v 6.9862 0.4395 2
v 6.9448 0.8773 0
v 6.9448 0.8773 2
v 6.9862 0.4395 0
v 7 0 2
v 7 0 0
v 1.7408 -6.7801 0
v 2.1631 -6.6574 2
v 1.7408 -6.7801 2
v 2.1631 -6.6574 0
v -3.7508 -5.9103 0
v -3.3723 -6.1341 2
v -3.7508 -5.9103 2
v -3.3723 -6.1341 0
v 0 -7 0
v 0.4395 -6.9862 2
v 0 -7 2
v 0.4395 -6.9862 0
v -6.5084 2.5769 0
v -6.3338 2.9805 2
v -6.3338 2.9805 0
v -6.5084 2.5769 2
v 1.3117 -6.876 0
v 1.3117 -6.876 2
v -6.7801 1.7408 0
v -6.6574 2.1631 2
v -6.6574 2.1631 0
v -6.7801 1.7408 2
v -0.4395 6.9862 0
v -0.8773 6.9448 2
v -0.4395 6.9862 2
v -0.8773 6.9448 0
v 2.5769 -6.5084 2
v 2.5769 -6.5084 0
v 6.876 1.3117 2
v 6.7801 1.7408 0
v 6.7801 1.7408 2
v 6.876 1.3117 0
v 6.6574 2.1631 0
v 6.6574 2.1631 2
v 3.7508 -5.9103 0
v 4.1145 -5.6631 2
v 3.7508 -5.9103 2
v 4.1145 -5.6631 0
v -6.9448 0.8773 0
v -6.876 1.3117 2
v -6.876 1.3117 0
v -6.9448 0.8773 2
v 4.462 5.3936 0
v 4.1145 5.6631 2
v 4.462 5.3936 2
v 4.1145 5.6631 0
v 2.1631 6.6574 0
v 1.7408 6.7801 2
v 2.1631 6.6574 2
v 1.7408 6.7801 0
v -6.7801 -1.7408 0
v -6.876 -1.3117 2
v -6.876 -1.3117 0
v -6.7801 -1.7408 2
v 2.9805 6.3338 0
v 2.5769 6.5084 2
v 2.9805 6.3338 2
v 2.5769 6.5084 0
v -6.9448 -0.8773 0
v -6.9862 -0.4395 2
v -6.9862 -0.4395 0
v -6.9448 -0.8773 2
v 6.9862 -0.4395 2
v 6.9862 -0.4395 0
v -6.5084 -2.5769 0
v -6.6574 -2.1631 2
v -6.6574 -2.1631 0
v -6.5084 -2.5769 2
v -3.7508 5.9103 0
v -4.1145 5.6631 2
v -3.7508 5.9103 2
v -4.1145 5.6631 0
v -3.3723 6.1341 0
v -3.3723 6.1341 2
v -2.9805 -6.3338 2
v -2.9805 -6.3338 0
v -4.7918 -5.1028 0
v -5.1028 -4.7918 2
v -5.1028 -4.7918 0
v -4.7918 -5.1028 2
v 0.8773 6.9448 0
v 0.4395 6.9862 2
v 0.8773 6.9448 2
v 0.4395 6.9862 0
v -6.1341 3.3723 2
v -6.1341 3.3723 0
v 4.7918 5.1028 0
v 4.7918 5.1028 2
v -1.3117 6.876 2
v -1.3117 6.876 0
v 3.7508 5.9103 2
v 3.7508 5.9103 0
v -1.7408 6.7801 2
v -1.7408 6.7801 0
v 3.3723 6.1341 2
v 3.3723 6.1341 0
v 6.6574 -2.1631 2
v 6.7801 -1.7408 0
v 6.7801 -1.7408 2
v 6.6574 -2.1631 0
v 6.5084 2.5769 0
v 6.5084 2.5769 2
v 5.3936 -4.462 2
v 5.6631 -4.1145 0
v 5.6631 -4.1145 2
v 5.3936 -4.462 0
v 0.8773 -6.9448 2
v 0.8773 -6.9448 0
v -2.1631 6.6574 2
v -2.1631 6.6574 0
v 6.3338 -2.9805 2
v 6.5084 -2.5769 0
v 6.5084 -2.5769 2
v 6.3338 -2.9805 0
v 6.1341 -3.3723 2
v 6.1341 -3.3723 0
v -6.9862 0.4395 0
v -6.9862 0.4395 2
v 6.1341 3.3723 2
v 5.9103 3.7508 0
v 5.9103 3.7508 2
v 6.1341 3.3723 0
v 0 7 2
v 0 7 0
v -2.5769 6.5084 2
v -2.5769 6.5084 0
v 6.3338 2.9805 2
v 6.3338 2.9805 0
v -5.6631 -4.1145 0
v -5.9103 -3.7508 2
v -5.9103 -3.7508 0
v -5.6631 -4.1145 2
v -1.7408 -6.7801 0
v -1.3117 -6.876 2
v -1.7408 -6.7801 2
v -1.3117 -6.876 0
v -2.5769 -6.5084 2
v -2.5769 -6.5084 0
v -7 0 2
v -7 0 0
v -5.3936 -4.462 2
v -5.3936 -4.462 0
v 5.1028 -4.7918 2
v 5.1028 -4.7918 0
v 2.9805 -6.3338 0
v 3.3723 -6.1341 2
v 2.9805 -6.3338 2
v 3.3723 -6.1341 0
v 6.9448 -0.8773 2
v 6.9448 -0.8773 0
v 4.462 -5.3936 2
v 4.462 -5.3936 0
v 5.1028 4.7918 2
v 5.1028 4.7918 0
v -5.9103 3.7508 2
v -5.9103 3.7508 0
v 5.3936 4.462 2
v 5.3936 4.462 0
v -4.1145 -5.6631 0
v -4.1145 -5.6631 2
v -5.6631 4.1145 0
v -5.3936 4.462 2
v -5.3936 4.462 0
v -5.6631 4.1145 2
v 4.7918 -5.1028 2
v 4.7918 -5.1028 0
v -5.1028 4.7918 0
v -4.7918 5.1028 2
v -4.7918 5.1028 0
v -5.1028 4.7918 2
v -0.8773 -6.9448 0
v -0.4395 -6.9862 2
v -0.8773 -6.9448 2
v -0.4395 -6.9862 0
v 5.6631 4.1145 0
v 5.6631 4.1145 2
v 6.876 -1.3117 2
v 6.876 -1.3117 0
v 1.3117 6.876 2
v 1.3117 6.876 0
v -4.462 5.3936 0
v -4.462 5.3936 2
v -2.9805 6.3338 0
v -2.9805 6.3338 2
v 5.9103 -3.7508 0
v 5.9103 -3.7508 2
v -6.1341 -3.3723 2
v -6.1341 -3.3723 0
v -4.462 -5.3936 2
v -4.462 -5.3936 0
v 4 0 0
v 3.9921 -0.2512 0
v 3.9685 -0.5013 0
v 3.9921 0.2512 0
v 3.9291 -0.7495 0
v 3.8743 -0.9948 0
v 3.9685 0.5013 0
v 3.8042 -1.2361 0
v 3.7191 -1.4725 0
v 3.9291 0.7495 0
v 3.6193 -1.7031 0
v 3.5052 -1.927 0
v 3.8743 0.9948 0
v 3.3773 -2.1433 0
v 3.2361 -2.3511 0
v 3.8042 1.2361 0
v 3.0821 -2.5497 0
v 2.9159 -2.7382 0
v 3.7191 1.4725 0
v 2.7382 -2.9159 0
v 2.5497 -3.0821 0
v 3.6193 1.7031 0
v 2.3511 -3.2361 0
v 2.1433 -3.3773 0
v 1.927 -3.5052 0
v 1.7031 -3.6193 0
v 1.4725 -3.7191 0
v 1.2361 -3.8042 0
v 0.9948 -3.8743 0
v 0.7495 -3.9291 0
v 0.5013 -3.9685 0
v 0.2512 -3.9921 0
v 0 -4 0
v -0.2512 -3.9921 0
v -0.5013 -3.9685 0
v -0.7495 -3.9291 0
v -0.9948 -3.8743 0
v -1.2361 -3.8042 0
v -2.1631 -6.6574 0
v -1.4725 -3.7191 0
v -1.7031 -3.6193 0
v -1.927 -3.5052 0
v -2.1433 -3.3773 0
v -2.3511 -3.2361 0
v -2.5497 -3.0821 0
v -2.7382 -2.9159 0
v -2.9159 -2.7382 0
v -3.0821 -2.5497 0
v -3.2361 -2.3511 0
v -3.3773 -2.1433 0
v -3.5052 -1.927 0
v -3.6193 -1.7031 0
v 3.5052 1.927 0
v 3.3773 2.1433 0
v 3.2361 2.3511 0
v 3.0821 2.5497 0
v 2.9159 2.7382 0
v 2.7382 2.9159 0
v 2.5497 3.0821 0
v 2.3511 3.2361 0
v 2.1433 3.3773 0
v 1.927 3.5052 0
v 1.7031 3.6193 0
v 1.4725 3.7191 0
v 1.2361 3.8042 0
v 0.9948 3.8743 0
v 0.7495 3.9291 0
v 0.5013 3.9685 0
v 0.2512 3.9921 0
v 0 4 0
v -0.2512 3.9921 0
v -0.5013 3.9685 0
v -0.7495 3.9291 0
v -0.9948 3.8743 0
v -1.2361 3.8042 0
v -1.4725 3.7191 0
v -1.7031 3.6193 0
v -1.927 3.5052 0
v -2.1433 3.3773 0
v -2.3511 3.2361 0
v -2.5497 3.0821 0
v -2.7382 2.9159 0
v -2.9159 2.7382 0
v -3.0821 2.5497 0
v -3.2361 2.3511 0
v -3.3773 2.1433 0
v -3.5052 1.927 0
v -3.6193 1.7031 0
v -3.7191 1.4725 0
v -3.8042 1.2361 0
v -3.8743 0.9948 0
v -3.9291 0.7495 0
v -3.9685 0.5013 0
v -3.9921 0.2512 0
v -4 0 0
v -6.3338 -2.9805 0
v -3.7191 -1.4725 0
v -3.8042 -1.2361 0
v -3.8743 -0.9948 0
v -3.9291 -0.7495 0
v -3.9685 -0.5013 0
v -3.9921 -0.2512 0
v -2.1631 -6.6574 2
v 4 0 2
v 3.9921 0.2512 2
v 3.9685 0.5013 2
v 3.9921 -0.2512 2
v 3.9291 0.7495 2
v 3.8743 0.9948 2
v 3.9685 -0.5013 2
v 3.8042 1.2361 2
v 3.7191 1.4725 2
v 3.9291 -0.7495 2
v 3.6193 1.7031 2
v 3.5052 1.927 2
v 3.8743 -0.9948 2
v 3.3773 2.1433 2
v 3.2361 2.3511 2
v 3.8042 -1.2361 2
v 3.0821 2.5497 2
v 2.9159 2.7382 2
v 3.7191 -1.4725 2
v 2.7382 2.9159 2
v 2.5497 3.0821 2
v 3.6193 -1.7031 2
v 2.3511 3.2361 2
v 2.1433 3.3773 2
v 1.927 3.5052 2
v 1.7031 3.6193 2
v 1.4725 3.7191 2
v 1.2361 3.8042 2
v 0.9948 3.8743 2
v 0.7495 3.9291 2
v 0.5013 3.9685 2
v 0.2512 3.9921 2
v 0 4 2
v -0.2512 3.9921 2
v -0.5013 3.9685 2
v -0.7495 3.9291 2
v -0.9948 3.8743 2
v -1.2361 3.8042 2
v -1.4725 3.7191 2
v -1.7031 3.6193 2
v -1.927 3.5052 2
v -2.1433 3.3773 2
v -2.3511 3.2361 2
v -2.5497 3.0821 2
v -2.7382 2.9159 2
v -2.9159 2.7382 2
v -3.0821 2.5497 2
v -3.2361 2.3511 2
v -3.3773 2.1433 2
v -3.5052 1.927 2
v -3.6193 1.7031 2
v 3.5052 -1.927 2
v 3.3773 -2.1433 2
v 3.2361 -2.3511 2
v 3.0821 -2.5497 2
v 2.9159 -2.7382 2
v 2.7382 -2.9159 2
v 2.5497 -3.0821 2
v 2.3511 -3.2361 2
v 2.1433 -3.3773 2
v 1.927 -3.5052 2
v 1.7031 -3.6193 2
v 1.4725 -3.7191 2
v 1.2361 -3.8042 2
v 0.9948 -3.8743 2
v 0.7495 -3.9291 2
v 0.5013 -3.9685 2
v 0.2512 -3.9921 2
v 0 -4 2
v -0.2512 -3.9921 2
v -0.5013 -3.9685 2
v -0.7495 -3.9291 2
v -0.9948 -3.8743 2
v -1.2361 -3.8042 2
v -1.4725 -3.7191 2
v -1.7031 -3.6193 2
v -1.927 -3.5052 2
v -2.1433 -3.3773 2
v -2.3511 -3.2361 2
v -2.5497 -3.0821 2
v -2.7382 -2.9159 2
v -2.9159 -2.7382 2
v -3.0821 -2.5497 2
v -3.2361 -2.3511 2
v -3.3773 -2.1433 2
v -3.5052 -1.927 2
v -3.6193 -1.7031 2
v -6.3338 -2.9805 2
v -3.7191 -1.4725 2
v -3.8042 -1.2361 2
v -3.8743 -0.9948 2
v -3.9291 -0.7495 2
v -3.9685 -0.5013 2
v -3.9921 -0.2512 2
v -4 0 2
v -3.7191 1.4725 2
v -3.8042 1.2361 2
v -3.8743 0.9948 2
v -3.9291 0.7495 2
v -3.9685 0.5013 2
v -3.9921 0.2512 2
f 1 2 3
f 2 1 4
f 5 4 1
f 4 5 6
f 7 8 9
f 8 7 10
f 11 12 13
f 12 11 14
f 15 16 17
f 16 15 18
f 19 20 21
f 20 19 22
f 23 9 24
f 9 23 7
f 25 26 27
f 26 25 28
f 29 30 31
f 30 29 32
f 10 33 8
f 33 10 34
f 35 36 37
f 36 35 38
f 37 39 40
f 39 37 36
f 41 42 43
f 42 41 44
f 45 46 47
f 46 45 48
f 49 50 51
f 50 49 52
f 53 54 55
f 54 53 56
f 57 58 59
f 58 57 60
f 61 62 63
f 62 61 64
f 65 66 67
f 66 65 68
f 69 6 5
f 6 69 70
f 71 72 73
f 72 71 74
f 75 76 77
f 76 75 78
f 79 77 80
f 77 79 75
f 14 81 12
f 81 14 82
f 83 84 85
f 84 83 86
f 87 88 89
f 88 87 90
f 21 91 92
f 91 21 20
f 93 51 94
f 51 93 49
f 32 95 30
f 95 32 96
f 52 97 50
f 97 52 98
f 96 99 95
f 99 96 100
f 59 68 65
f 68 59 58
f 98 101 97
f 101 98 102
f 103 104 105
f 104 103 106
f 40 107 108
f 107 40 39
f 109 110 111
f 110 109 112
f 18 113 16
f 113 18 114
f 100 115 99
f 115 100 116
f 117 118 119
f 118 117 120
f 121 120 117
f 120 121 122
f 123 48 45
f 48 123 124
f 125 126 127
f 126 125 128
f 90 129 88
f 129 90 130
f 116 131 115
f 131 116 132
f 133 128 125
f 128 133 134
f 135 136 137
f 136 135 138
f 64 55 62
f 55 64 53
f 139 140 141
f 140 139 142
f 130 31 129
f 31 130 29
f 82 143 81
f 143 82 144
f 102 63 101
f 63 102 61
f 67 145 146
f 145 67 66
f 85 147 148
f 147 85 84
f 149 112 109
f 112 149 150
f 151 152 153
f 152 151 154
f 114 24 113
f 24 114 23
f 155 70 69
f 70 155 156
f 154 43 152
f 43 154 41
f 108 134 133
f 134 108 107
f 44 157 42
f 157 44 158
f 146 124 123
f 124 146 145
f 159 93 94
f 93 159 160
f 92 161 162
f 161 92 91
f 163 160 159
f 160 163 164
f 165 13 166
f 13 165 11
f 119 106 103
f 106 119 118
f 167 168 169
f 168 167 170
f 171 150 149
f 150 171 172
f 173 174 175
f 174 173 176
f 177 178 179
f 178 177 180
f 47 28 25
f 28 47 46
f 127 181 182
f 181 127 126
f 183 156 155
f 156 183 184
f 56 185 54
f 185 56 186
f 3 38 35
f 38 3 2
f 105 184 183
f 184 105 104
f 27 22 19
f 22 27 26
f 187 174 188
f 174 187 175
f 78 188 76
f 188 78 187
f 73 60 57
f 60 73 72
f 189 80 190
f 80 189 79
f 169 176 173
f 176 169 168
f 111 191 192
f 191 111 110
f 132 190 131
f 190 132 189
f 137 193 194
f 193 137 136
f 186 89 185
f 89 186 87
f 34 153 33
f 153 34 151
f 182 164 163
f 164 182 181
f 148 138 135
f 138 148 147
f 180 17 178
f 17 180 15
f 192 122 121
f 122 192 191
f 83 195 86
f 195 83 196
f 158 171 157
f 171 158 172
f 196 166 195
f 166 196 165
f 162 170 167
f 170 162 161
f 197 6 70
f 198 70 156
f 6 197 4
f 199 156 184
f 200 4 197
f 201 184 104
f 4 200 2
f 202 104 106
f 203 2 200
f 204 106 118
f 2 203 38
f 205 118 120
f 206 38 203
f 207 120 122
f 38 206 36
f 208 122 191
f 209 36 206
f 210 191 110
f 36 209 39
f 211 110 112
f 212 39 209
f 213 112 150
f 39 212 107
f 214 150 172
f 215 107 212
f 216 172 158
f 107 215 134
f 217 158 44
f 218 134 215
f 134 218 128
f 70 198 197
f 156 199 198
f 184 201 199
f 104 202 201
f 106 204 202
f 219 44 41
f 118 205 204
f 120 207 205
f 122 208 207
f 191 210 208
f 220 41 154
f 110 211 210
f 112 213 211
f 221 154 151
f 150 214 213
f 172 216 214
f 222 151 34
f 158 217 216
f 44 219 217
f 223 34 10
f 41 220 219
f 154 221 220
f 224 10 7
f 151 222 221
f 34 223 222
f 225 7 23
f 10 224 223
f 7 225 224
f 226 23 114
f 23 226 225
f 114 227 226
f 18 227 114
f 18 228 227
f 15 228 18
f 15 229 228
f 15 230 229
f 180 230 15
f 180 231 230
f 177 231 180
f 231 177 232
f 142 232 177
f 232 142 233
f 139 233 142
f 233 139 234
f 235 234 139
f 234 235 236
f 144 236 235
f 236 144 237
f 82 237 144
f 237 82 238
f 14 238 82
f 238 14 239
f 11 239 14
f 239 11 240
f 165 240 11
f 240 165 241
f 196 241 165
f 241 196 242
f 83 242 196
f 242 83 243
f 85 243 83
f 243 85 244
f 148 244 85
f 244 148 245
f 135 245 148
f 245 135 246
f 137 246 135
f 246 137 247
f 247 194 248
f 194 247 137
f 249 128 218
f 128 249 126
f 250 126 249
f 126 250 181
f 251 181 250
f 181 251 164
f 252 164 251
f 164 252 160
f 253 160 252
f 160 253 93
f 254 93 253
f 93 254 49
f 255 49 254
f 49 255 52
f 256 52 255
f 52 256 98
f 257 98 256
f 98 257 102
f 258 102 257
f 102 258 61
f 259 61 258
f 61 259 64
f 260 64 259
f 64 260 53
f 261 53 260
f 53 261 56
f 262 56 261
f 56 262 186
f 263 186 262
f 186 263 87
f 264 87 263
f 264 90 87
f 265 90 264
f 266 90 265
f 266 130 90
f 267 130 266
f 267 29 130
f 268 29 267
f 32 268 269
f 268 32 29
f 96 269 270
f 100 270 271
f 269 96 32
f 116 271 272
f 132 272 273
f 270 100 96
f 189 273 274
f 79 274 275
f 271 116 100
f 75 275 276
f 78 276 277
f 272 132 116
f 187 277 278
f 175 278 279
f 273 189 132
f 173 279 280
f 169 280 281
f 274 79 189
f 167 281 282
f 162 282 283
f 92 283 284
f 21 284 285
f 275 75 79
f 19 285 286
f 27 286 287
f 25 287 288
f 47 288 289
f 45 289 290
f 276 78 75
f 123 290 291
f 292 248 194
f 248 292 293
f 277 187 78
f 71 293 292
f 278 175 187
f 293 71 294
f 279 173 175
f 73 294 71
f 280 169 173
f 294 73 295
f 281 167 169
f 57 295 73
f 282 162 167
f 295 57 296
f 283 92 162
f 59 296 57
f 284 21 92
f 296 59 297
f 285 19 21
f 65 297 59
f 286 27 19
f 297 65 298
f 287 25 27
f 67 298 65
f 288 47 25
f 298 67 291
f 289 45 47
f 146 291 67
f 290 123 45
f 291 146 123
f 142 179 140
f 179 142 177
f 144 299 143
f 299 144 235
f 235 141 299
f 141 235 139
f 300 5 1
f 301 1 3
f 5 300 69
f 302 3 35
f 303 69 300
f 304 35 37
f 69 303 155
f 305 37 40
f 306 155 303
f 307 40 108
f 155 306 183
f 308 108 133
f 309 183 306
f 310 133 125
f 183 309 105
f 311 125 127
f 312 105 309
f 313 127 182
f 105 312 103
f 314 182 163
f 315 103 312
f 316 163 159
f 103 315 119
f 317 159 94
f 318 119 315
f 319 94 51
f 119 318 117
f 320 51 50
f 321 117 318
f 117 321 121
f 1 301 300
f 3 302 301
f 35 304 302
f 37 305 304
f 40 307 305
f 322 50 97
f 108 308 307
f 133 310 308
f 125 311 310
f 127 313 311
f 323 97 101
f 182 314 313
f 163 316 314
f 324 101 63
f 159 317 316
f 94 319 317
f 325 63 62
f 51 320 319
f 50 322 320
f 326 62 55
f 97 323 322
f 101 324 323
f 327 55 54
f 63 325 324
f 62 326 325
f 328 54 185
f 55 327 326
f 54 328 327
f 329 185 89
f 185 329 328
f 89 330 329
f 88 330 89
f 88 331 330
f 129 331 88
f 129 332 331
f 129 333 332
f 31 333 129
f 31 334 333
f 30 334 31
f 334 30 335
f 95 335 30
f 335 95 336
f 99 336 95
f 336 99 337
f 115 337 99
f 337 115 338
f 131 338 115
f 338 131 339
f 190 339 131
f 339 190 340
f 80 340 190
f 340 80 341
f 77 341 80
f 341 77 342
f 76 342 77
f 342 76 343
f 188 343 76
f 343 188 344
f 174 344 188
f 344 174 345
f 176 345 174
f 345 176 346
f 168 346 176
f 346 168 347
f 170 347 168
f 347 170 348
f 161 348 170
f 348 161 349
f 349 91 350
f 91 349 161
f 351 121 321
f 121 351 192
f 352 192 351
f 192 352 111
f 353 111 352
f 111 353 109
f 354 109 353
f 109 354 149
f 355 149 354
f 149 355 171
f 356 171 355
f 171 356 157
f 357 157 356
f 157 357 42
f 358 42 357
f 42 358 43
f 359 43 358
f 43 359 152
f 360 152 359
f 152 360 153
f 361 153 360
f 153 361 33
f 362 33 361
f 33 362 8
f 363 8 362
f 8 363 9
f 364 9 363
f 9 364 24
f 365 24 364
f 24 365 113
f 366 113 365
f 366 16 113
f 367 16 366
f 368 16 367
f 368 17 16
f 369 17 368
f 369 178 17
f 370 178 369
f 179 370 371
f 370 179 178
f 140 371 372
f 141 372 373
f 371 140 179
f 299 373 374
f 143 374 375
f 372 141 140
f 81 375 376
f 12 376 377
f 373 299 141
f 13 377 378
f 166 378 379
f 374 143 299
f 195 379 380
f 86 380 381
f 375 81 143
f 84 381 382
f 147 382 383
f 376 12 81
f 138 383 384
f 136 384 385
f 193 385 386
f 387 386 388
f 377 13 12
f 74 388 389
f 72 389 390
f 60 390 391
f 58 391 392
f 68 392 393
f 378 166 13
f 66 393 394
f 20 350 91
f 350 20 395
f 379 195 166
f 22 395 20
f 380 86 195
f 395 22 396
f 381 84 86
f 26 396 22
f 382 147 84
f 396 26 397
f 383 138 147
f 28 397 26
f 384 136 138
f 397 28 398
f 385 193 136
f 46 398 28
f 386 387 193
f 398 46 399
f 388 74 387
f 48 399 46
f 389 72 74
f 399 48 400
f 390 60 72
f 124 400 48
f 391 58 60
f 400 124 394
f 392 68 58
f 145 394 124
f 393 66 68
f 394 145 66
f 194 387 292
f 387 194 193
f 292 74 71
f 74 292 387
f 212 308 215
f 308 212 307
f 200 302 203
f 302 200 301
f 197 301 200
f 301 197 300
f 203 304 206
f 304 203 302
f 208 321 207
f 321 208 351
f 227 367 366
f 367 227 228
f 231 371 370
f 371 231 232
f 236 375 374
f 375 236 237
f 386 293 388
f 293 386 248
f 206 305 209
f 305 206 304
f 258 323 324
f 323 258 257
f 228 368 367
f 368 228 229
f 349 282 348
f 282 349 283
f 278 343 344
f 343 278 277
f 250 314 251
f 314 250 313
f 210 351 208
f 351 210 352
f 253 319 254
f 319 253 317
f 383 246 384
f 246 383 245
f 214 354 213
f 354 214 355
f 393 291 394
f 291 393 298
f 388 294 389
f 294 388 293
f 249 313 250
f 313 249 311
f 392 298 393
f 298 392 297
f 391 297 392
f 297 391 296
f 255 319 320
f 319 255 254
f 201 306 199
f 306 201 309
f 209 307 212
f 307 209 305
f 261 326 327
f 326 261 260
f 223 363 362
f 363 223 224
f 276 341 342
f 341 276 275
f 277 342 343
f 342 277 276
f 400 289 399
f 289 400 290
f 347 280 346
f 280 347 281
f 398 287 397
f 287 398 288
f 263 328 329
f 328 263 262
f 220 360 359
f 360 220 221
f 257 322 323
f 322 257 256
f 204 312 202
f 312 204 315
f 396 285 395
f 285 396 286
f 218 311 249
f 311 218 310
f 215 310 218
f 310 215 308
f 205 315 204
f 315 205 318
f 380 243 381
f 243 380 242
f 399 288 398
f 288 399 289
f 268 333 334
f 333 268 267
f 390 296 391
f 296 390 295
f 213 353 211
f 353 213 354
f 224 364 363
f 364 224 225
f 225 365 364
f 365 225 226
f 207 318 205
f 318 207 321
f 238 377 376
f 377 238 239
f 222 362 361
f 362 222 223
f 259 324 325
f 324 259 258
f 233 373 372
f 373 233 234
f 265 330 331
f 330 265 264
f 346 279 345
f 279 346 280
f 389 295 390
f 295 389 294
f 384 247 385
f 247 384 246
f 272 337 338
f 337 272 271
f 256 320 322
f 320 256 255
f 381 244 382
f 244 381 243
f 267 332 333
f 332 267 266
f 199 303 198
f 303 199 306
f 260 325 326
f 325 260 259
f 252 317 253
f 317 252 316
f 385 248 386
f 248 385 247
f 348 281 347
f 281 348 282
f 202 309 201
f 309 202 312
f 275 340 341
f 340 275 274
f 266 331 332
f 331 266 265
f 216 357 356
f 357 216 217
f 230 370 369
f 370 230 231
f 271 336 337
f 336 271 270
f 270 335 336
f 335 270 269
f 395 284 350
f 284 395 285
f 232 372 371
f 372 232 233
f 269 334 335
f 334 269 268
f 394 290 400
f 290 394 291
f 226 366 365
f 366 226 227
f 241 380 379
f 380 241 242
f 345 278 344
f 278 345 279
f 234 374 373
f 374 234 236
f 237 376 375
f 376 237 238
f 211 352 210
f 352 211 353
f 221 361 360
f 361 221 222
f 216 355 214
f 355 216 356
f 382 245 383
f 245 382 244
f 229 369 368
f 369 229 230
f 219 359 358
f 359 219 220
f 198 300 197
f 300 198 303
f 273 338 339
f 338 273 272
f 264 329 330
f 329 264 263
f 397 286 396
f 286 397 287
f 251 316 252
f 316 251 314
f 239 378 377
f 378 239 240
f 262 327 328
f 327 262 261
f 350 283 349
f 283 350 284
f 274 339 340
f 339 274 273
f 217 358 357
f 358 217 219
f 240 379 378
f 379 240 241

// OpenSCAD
/* Washer by Mike Thompson */

inner_diameter=8;
outer_diameter=14;
thickness=2;

difference()
{
	cylinder(r=outer_diameter/2,h=thickness,$fn=100);
	cylinder(r=inner_diameter/2,h=thickness,$fn=100);
}
